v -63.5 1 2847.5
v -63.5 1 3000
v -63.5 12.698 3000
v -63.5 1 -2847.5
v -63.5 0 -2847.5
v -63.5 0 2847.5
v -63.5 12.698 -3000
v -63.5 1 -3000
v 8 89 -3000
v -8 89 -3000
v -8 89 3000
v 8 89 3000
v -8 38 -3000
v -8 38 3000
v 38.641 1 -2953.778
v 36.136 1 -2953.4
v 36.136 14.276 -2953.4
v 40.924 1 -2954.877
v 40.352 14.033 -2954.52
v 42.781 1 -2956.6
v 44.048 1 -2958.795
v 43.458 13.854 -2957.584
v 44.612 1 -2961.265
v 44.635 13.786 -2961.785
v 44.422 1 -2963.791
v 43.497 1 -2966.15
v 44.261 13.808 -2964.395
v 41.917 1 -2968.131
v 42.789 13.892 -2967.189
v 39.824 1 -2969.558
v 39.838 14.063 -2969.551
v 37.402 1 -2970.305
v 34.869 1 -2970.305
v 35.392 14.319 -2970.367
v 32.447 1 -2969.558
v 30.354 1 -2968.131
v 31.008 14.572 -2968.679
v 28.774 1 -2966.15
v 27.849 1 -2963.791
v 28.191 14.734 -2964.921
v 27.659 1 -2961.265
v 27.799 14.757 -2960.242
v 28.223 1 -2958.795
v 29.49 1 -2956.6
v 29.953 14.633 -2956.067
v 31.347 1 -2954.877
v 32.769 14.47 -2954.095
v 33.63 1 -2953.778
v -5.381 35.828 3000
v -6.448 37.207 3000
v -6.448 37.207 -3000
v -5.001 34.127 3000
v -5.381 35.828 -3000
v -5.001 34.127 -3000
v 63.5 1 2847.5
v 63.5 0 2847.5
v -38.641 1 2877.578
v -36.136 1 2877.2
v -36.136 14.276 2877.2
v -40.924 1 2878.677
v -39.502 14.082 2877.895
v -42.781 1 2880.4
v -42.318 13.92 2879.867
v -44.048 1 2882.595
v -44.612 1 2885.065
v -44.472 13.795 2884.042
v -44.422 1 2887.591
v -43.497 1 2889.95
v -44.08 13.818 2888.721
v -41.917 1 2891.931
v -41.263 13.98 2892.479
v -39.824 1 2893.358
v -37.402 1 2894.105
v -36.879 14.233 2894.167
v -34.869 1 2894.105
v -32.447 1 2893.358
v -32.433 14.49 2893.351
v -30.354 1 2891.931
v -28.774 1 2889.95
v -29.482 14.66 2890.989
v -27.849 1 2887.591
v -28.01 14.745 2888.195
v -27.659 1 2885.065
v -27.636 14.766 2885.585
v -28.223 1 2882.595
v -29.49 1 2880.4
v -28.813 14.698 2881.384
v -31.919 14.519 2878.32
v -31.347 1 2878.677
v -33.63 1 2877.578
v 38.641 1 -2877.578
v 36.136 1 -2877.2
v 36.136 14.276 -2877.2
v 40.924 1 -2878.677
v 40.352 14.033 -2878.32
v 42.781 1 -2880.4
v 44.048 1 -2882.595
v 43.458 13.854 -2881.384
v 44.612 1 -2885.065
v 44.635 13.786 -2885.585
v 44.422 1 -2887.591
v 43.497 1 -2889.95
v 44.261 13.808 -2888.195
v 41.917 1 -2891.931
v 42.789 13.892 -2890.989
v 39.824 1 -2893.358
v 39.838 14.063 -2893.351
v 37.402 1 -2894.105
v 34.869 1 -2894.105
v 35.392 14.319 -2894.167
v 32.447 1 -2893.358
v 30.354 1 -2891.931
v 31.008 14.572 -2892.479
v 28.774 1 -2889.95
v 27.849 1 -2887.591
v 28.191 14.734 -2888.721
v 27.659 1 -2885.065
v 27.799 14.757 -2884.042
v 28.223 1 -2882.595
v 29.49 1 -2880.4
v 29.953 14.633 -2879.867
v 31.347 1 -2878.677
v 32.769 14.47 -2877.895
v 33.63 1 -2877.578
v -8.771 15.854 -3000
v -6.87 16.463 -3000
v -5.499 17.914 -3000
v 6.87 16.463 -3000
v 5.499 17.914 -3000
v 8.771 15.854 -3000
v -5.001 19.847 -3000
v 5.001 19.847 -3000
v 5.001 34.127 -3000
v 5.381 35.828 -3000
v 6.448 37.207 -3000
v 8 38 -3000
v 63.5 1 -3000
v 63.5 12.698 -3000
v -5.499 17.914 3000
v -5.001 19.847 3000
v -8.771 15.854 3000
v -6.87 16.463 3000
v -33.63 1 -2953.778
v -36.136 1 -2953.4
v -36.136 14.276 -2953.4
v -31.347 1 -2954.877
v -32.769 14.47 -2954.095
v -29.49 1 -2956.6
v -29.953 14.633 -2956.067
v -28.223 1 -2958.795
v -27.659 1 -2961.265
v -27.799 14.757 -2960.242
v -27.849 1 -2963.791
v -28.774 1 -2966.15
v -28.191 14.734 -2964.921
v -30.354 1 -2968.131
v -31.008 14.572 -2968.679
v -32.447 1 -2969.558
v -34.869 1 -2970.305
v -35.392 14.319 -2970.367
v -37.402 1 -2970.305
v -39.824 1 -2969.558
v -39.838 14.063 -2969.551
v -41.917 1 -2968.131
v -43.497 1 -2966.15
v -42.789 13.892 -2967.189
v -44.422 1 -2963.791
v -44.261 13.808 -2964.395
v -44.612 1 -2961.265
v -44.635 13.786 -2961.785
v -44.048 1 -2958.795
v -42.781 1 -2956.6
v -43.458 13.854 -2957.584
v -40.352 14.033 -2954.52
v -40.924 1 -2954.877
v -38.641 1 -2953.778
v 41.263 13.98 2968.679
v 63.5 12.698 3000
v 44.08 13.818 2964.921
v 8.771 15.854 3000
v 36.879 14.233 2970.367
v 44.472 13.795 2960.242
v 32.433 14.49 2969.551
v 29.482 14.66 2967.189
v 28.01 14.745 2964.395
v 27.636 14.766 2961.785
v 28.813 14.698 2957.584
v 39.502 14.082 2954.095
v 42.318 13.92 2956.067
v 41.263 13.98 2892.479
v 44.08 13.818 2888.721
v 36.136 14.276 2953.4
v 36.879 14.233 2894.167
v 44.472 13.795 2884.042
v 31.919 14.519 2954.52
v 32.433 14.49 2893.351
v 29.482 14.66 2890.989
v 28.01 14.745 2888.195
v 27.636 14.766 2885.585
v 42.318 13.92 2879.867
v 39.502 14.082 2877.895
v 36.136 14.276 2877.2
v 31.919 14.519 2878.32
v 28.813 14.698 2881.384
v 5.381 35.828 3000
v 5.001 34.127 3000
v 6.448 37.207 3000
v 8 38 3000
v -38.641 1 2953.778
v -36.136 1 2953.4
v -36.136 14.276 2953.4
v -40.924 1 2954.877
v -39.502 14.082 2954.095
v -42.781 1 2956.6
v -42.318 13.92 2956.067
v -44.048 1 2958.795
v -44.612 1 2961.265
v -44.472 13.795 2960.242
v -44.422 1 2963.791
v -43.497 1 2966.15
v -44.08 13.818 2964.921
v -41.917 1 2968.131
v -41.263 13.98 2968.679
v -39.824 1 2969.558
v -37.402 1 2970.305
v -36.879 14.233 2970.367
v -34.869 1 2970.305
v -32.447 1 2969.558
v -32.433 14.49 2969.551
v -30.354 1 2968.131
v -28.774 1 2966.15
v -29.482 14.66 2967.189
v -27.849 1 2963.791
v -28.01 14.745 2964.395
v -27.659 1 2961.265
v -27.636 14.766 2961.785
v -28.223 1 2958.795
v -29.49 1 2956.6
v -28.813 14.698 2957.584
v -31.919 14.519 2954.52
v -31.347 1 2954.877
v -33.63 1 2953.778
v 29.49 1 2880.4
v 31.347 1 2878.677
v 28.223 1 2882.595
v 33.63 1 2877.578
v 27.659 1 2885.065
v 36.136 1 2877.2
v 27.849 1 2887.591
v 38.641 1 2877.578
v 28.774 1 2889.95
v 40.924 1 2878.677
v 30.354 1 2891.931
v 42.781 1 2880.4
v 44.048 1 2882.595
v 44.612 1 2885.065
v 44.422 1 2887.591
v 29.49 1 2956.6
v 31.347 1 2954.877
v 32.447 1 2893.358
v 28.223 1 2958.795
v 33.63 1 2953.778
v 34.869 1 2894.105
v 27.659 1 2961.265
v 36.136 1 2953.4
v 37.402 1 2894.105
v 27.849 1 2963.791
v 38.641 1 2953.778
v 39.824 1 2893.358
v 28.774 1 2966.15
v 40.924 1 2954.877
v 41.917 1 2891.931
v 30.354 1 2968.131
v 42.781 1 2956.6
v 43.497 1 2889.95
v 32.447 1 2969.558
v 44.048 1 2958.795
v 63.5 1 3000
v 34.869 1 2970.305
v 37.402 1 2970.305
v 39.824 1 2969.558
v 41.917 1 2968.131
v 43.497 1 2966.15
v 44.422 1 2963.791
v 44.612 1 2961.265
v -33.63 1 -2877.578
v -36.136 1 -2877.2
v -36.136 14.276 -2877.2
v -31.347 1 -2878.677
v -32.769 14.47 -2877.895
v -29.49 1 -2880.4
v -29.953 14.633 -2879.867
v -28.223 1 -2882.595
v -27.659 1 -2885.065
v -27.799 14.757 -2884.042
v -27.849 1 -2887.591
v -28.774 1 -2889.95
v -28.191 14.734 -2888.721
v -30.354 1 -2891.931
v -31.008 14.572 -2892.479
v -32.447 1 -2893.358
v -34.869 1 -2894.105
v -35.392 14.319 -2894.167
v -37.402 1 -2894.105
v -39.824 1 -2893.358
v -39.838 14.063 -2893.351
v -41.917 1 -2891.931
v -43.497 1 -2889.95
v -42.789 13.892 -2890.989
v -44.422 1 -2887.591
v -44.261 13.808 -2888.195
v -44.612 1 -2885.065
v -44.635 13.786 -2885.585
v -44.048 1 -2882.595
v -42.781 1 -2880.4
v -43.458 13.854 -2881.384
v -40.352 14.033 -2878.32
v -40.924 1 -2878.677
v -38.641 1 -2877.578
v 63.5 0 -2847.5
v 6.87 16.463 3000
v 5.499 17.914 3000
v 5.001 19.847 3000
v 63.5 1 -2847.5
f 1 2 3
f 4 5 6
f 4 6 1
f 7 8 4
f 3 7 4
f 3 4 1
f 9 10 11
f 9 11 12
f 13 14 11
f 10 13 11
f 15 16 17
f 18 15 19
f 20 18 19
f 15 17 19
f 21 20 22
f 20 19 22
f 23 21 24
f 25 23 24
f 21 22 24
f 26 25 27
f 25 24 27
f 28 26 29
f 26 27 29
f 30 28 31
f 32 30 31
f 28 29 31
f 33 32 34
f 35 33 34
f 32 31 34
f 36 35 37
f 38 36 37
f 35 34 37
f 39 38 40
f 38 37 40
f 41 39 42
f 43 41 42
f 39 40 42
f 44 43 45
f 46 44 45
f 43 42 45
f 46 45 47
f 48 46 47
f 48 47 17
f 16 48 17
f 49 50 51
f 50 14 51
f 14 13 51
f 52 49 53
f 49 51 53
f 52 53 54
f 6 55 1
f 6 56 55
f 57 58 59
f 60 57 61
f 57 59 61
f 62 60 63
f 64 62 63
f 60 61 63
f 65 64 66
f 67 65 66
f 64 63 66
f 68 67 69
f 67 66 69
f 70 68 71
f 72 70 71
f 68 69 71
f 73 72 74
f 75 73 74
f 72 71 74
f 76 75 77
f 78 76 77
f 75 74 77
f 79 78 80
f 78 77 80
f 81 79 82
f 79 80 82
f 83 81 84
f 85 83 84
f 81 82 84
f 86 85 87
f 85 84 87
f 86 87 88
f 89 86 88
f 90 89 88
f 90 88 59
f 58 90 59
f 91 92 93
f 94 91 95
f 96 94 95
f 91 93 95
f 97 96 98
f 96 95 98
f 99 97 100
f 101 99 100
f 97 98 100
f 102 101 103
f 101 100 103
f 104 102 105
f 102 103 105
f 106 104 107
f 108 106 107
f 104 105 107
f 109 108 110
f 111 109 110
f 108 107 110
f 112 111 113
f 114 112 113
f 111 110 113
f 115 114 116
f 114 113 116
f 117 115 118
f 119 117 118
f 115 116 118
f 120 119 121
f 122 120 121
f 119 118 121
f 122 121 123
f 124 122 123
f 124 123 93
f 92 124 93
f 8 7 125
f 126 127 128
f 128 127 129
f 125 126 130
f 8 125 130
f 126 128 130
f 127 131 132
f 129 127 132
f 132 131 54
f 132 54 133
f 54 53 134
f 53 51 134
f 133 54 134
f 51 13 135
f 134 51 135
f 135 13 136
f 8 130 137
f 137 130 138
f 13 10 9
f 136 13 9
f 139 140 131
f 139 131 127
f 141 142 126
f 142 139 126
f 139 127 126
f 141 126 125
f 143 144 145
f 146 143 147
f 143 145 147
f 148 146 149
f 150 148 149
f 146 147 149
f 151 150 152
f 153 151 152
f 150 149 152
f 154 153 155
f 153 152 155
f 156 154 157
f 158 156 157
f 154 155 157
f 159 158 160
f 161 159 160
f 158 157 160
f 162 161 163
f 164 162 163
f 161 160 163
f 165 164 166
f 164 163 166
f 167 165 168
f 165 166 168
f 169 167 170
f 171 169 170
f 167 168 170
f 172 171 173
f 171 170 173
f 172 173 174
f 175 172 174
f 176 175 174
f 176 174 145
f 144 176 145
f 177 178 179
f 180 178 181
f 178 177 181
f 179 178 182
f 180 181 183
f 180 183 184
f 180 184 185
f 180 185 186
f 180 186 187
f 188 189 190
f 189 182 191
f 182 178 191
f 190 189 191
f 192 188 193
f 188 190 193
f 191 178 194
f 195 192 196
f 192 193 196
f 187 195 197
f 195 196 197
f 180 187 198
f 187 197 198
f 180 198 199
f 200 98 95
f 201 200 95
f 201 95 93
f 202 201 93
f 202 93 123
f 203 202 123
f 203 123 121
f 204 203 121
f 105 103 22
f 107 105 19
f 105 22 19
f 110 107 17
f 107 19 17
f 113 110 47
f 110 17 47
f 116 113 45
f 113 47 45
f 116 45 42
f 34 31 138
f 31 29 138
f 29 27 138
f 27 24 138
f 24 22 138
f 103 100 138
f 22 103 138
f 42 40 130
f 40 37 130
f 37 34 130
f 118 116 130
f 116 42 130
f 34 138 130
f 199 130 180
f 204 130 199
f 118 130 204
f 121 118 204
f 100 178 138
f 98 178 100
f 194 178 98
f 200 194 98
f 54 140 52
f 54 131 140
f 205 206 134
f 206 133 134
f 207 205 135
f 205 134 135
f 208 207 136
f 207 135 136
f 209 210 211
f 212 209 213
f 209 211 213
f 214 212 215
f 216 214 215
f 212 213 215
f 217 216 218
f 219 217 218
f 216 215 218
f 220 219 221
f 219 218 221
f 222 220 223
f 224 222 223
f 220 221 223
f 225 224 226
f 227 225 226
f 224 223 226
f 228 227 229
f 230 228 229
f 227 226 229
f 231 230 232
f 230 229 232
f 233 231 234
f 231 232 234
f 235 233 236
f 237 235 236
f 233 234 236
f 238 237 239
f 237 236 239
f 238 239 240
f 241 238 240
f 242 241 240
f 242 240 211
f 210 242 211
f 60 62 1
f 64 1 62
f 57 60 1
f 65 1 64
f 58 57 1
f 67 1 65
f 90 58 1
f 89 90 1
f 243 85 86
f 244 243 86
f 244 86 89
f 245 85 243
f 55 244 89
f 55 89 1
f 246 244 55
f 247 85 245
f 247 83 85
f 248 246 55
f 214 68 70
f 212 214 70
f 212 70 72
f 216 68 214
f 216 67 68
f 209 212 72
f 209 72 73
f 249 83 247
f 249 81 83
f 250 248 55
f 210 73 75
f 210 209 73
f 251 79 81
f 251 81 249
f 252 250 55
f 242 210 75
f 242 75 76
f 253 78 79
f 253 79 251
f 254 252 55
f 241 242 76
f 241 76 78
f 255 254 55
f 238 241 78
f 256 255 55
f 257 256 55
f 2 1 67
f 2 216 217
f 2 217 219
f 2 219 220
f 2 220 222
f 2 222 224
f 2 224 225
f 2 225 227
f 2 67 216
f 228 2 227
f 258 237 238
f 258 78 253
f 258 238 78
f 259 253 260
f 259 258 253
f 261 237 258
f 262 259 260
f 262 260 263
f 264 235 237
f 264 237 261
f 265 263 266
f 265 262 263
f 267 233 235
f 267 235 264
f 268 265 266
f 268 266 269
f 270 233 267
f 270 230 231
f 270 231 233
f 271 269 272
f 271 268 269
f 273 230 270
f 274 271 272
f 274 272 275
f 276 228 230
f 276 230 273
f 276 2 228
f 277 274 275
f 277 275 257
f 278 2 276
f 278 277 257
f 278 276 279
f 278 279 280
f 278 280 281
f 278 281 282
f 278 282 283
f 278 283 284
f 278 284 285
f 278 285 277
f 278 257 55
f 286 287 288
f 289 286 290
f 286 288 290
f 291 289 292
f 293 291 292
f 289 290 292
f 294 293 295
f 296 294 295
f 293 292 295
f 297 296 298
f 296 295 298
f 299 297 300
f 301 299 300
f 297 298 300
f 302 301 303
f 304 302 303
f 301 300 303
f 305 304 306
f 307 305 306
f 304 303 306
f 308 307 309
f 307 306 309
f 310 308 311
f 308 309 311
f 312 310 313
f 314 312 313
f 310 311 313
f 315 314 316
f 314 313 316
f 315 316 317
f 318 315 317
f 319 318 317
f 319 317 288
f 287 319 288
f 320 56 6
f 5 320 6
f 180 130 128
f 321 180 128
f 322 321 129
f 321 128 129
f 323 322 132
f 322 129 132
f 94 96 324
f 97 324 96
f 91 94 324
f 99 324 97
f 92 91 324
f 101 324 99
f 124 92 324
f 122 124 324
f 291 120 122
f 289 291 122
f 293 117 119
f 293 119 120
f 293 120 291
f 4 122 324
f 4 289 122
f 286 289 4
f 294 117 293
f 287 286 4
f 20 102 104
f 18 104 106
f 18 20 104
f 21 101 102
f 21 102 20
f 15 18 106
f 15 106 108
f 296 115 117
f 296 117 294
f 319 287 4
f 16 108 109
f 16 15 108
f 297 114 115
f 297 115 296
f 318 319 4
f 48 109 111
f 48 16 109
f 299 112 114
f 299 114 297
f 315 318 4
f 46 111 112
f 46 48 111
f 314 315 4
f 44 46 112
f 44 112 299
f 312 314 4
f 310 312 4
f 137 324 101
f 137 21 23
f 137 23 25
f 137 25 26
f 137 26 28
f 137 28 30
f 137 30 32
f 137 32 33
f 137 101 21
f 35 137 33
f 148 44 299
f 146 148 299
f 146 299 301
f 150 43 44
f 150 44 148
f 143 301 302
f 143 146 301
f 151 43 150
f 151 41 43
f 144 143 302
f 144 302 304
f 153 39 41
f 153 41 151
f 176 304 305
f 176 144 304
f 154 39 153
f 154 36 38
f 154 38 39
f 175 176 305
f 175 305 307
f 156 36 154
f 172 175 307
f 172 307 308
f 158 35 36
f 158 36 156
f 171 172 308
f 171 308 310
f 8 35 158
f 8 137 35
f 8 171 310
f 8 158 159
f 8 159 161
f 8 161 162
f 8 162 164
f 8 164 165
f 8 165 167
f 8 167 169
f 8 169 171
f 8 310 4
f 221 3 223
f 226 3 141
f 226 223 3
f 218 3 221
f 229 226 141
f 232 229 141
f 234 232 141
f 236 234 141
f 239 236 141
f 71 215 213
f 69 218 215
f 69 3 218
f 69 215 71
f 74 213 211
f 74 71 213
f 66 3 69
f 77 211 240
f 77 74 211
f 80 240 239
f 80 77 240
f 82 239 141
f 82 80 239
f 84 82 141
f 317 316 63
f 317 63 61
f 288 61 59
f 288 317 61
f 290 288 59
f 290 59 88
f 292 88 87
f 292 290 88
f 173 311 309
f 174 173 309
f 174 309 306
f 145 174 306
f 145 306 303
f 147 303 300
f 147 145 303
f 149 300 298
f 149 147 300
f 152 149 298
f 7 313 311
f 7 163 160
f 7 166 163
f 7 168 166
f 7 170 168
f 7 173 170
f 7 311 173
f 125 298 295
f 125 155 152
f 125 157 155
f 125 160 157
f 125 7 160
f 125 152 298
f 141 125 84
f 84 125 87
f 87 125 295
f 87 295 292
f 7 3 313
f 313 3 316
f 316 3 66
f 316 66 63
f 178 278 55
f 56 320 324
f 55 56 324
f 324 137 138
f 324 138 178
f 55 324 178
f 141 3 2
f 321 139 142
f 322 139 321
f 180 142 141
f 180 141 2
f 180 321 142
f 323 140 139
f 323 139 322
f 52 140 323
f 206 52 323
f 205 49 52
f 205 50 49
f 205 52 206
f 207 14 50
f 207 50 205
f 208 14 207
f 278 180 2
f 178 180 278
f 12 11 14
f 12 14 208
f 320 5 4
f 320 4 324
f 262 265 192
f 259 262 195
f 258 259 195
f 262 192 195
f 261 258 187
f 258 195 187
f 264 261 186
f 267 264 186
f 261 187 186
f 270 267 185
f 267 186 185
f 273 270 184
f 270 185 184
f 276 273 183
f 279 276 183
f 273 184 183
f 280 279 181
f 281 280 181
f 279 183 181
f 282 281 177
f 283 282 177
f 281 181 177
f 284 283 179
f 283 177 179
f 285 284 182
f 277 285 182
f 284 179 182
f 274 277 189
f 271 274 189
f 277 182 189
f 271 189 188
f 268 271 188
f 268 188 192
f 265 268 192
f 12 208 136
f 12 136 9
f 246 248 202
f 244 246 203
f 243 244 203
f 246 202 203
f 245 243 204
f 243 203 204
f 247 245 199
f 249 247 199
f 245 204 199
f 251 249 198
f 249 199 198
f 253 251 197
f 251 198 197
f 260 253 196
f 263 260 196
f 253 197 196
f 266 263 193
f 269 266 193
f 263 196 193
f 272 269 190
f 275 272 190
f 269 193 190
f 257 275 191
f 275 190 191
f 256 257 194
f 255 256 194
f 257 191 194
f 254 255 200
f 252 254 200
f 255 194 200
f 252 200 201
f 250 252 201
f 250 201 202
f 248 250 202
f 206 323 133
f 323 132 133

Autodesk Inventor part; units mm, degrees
ref_plane "YZ Plane" through (0, 0, 0) normal (1, 0, 0) x (0, 1, 0)
ref_plane "XZ Plane" through (0, 0, 0) normal (0, 1, 0) x (-1, 0, 0)
ref_plane "XY Plane" through (0, 0, 0) normal (0, 0, 1) x (1, 0, 0)
sketch "Эскиз1" plane through (0, 0, 0) normal (0, 0, 1) x (1, 0, 0)
  line L0 (0, 0) -> (0, 188.5182) construction
  line L1 (0, 0) -> (-63.5, 0)
  line L2 (-63.5, 0) -> (-63.5, 12.6983)
  line L3 (-63.5, 12.6983) -> (-8.7709, 15.8539)
  arc A0 (-8.7709, 15.8539) -> (-5.0012, 19.8473) centre (-9.0012, 19.8473) ccw
  line L4 (-5.0012, 19.8473) -> (-5.0012, 34.1273)
  arc A1 (-5.0012, 34.1273) -> (-8, 38) centre (-9.0012, 34.1273) ccw
  line L5 (-8, 38) -> (-8, 89)
  line L6 (-8, 89) -> (0, 89)
  line L7 (0, 0) -> (63.5, 0)
  line L8 (63.5, 0) -> (63.5, 12.6983)
  line L9 (63.5, 12.6983) -> (8.7709, 15.8539)
  arc A2 (5.0012, 19.8473) -> (8.7709, 15.8539) centre (9.0012, 19.8473) ccw
  line L10 (5.0012, 19.8473) -> (5.0012, 34.1273)
  arc A3 (8, 38) -> (5.0012, 34.1273) centre (9.0012, 34.1273) ccw
  line L11 (8, 38) -> (8, 89)
  line L12 (8, 89) -> (0, 89)
  dimension "d1" = 63.5
  dimension "d2" = 54.82
  dimension "d3" = 14.28
  dimension "d4" = 8
  dimension "d5" = 89
  dimension "d6" = 93.3
  dimension "d7" = 4
  dimension "d8" = 4
  dimension "d9" = 51
extrude "Выдавливание1" add sketch "Эскиз1" along normal mid plane 6000
sketch "Эскиз3" plane through (-63.5, 0, 3000) normal (0, -1, 0) x (1, 0, 0)
  line L0 (127, -6000) -> (127, 0) projected
  line L1 (0, 0) -> (127, 0) projected
  line L2 (0, -6000) -> (0, 0) projected
  line L3 (127, -6000) -> (0, -6000) projected
  line L4 (55.5, -6000) -> (55.5, 0) projected
  line L5 (71.5, 0) -> (55.5, 0) projected
  line L6 (71.5, -6000) -> (71.5, 0) projected
  line L7 (55.5, -6000) -> (71.5, -6000) projected
  line L8 (127, 0) -> (72.2709, 0) projected
  line L9 (54.7291, 0) -> (0, 0) projected
  point P0 (63.5, -3000)
  point P1 (99.6355, -38.1)
  point P2 (99.6355, -114.3)
  point P3 (27.3645, -38.1)
  point P4 (27.3645, -114.3)
  point P5 (99.6355, 0)
  point P6 (27.3645, 0)
  dimension "d14" = 38.1
  dimension "d15" = 76.2
hole "Отверстие1" at (36.1355, 0, 2961.9) at (36.1355, 0, 2885.7) at (-36.1355, 0, 2961.9) at (-36.1355, 0, 2885.7) direction (0, 1, 0) diameter 17 end through all
sketch "Эскиз4" plane through (-63.5, 0, 3000) normal (0, -1, 0) x (1, 0, 0)
  circle A0 centre (27.3645, -38.1) radius 8.5 projected
  circle A1 centre (99.6355, -38.1) radius 8.5 projected
  circle A2 centre (99.6355, -114.3) radius 8.5 projected
  circle A3 centre (27.3645, -114.3) radius 8.5 projected
  line L0 (127, -6000) -> (127, 0) projected
  line L1 (0, 0) -> (127, 0) projected
  line L2 (0, -6000) -> (0, 0) projected
  line L3 (127, -6000) -> (0, -6000) projected
  line L4 (127, 0) -> (127, -6000) projected
  line L5 (127, -152.5) -> (0, -152.5)
  line L6 (0, -6000) -> (0, 0) projected
  point P0 (63.5, -3000)
  dimension "d23" = 152.5
extrude "Выдавливание2" cut sketch "Эскиз4" against normal blind 1 contours L5 L2 L1 L0
mirror "Зеркальное отражение2" about plane through (0, 0, 0) normal (0, 0, 1) of "Отверстие1", "Выдавливание2"
equation "\"d8\" = d7"
properties part number "Lift.01.00.00.01"
